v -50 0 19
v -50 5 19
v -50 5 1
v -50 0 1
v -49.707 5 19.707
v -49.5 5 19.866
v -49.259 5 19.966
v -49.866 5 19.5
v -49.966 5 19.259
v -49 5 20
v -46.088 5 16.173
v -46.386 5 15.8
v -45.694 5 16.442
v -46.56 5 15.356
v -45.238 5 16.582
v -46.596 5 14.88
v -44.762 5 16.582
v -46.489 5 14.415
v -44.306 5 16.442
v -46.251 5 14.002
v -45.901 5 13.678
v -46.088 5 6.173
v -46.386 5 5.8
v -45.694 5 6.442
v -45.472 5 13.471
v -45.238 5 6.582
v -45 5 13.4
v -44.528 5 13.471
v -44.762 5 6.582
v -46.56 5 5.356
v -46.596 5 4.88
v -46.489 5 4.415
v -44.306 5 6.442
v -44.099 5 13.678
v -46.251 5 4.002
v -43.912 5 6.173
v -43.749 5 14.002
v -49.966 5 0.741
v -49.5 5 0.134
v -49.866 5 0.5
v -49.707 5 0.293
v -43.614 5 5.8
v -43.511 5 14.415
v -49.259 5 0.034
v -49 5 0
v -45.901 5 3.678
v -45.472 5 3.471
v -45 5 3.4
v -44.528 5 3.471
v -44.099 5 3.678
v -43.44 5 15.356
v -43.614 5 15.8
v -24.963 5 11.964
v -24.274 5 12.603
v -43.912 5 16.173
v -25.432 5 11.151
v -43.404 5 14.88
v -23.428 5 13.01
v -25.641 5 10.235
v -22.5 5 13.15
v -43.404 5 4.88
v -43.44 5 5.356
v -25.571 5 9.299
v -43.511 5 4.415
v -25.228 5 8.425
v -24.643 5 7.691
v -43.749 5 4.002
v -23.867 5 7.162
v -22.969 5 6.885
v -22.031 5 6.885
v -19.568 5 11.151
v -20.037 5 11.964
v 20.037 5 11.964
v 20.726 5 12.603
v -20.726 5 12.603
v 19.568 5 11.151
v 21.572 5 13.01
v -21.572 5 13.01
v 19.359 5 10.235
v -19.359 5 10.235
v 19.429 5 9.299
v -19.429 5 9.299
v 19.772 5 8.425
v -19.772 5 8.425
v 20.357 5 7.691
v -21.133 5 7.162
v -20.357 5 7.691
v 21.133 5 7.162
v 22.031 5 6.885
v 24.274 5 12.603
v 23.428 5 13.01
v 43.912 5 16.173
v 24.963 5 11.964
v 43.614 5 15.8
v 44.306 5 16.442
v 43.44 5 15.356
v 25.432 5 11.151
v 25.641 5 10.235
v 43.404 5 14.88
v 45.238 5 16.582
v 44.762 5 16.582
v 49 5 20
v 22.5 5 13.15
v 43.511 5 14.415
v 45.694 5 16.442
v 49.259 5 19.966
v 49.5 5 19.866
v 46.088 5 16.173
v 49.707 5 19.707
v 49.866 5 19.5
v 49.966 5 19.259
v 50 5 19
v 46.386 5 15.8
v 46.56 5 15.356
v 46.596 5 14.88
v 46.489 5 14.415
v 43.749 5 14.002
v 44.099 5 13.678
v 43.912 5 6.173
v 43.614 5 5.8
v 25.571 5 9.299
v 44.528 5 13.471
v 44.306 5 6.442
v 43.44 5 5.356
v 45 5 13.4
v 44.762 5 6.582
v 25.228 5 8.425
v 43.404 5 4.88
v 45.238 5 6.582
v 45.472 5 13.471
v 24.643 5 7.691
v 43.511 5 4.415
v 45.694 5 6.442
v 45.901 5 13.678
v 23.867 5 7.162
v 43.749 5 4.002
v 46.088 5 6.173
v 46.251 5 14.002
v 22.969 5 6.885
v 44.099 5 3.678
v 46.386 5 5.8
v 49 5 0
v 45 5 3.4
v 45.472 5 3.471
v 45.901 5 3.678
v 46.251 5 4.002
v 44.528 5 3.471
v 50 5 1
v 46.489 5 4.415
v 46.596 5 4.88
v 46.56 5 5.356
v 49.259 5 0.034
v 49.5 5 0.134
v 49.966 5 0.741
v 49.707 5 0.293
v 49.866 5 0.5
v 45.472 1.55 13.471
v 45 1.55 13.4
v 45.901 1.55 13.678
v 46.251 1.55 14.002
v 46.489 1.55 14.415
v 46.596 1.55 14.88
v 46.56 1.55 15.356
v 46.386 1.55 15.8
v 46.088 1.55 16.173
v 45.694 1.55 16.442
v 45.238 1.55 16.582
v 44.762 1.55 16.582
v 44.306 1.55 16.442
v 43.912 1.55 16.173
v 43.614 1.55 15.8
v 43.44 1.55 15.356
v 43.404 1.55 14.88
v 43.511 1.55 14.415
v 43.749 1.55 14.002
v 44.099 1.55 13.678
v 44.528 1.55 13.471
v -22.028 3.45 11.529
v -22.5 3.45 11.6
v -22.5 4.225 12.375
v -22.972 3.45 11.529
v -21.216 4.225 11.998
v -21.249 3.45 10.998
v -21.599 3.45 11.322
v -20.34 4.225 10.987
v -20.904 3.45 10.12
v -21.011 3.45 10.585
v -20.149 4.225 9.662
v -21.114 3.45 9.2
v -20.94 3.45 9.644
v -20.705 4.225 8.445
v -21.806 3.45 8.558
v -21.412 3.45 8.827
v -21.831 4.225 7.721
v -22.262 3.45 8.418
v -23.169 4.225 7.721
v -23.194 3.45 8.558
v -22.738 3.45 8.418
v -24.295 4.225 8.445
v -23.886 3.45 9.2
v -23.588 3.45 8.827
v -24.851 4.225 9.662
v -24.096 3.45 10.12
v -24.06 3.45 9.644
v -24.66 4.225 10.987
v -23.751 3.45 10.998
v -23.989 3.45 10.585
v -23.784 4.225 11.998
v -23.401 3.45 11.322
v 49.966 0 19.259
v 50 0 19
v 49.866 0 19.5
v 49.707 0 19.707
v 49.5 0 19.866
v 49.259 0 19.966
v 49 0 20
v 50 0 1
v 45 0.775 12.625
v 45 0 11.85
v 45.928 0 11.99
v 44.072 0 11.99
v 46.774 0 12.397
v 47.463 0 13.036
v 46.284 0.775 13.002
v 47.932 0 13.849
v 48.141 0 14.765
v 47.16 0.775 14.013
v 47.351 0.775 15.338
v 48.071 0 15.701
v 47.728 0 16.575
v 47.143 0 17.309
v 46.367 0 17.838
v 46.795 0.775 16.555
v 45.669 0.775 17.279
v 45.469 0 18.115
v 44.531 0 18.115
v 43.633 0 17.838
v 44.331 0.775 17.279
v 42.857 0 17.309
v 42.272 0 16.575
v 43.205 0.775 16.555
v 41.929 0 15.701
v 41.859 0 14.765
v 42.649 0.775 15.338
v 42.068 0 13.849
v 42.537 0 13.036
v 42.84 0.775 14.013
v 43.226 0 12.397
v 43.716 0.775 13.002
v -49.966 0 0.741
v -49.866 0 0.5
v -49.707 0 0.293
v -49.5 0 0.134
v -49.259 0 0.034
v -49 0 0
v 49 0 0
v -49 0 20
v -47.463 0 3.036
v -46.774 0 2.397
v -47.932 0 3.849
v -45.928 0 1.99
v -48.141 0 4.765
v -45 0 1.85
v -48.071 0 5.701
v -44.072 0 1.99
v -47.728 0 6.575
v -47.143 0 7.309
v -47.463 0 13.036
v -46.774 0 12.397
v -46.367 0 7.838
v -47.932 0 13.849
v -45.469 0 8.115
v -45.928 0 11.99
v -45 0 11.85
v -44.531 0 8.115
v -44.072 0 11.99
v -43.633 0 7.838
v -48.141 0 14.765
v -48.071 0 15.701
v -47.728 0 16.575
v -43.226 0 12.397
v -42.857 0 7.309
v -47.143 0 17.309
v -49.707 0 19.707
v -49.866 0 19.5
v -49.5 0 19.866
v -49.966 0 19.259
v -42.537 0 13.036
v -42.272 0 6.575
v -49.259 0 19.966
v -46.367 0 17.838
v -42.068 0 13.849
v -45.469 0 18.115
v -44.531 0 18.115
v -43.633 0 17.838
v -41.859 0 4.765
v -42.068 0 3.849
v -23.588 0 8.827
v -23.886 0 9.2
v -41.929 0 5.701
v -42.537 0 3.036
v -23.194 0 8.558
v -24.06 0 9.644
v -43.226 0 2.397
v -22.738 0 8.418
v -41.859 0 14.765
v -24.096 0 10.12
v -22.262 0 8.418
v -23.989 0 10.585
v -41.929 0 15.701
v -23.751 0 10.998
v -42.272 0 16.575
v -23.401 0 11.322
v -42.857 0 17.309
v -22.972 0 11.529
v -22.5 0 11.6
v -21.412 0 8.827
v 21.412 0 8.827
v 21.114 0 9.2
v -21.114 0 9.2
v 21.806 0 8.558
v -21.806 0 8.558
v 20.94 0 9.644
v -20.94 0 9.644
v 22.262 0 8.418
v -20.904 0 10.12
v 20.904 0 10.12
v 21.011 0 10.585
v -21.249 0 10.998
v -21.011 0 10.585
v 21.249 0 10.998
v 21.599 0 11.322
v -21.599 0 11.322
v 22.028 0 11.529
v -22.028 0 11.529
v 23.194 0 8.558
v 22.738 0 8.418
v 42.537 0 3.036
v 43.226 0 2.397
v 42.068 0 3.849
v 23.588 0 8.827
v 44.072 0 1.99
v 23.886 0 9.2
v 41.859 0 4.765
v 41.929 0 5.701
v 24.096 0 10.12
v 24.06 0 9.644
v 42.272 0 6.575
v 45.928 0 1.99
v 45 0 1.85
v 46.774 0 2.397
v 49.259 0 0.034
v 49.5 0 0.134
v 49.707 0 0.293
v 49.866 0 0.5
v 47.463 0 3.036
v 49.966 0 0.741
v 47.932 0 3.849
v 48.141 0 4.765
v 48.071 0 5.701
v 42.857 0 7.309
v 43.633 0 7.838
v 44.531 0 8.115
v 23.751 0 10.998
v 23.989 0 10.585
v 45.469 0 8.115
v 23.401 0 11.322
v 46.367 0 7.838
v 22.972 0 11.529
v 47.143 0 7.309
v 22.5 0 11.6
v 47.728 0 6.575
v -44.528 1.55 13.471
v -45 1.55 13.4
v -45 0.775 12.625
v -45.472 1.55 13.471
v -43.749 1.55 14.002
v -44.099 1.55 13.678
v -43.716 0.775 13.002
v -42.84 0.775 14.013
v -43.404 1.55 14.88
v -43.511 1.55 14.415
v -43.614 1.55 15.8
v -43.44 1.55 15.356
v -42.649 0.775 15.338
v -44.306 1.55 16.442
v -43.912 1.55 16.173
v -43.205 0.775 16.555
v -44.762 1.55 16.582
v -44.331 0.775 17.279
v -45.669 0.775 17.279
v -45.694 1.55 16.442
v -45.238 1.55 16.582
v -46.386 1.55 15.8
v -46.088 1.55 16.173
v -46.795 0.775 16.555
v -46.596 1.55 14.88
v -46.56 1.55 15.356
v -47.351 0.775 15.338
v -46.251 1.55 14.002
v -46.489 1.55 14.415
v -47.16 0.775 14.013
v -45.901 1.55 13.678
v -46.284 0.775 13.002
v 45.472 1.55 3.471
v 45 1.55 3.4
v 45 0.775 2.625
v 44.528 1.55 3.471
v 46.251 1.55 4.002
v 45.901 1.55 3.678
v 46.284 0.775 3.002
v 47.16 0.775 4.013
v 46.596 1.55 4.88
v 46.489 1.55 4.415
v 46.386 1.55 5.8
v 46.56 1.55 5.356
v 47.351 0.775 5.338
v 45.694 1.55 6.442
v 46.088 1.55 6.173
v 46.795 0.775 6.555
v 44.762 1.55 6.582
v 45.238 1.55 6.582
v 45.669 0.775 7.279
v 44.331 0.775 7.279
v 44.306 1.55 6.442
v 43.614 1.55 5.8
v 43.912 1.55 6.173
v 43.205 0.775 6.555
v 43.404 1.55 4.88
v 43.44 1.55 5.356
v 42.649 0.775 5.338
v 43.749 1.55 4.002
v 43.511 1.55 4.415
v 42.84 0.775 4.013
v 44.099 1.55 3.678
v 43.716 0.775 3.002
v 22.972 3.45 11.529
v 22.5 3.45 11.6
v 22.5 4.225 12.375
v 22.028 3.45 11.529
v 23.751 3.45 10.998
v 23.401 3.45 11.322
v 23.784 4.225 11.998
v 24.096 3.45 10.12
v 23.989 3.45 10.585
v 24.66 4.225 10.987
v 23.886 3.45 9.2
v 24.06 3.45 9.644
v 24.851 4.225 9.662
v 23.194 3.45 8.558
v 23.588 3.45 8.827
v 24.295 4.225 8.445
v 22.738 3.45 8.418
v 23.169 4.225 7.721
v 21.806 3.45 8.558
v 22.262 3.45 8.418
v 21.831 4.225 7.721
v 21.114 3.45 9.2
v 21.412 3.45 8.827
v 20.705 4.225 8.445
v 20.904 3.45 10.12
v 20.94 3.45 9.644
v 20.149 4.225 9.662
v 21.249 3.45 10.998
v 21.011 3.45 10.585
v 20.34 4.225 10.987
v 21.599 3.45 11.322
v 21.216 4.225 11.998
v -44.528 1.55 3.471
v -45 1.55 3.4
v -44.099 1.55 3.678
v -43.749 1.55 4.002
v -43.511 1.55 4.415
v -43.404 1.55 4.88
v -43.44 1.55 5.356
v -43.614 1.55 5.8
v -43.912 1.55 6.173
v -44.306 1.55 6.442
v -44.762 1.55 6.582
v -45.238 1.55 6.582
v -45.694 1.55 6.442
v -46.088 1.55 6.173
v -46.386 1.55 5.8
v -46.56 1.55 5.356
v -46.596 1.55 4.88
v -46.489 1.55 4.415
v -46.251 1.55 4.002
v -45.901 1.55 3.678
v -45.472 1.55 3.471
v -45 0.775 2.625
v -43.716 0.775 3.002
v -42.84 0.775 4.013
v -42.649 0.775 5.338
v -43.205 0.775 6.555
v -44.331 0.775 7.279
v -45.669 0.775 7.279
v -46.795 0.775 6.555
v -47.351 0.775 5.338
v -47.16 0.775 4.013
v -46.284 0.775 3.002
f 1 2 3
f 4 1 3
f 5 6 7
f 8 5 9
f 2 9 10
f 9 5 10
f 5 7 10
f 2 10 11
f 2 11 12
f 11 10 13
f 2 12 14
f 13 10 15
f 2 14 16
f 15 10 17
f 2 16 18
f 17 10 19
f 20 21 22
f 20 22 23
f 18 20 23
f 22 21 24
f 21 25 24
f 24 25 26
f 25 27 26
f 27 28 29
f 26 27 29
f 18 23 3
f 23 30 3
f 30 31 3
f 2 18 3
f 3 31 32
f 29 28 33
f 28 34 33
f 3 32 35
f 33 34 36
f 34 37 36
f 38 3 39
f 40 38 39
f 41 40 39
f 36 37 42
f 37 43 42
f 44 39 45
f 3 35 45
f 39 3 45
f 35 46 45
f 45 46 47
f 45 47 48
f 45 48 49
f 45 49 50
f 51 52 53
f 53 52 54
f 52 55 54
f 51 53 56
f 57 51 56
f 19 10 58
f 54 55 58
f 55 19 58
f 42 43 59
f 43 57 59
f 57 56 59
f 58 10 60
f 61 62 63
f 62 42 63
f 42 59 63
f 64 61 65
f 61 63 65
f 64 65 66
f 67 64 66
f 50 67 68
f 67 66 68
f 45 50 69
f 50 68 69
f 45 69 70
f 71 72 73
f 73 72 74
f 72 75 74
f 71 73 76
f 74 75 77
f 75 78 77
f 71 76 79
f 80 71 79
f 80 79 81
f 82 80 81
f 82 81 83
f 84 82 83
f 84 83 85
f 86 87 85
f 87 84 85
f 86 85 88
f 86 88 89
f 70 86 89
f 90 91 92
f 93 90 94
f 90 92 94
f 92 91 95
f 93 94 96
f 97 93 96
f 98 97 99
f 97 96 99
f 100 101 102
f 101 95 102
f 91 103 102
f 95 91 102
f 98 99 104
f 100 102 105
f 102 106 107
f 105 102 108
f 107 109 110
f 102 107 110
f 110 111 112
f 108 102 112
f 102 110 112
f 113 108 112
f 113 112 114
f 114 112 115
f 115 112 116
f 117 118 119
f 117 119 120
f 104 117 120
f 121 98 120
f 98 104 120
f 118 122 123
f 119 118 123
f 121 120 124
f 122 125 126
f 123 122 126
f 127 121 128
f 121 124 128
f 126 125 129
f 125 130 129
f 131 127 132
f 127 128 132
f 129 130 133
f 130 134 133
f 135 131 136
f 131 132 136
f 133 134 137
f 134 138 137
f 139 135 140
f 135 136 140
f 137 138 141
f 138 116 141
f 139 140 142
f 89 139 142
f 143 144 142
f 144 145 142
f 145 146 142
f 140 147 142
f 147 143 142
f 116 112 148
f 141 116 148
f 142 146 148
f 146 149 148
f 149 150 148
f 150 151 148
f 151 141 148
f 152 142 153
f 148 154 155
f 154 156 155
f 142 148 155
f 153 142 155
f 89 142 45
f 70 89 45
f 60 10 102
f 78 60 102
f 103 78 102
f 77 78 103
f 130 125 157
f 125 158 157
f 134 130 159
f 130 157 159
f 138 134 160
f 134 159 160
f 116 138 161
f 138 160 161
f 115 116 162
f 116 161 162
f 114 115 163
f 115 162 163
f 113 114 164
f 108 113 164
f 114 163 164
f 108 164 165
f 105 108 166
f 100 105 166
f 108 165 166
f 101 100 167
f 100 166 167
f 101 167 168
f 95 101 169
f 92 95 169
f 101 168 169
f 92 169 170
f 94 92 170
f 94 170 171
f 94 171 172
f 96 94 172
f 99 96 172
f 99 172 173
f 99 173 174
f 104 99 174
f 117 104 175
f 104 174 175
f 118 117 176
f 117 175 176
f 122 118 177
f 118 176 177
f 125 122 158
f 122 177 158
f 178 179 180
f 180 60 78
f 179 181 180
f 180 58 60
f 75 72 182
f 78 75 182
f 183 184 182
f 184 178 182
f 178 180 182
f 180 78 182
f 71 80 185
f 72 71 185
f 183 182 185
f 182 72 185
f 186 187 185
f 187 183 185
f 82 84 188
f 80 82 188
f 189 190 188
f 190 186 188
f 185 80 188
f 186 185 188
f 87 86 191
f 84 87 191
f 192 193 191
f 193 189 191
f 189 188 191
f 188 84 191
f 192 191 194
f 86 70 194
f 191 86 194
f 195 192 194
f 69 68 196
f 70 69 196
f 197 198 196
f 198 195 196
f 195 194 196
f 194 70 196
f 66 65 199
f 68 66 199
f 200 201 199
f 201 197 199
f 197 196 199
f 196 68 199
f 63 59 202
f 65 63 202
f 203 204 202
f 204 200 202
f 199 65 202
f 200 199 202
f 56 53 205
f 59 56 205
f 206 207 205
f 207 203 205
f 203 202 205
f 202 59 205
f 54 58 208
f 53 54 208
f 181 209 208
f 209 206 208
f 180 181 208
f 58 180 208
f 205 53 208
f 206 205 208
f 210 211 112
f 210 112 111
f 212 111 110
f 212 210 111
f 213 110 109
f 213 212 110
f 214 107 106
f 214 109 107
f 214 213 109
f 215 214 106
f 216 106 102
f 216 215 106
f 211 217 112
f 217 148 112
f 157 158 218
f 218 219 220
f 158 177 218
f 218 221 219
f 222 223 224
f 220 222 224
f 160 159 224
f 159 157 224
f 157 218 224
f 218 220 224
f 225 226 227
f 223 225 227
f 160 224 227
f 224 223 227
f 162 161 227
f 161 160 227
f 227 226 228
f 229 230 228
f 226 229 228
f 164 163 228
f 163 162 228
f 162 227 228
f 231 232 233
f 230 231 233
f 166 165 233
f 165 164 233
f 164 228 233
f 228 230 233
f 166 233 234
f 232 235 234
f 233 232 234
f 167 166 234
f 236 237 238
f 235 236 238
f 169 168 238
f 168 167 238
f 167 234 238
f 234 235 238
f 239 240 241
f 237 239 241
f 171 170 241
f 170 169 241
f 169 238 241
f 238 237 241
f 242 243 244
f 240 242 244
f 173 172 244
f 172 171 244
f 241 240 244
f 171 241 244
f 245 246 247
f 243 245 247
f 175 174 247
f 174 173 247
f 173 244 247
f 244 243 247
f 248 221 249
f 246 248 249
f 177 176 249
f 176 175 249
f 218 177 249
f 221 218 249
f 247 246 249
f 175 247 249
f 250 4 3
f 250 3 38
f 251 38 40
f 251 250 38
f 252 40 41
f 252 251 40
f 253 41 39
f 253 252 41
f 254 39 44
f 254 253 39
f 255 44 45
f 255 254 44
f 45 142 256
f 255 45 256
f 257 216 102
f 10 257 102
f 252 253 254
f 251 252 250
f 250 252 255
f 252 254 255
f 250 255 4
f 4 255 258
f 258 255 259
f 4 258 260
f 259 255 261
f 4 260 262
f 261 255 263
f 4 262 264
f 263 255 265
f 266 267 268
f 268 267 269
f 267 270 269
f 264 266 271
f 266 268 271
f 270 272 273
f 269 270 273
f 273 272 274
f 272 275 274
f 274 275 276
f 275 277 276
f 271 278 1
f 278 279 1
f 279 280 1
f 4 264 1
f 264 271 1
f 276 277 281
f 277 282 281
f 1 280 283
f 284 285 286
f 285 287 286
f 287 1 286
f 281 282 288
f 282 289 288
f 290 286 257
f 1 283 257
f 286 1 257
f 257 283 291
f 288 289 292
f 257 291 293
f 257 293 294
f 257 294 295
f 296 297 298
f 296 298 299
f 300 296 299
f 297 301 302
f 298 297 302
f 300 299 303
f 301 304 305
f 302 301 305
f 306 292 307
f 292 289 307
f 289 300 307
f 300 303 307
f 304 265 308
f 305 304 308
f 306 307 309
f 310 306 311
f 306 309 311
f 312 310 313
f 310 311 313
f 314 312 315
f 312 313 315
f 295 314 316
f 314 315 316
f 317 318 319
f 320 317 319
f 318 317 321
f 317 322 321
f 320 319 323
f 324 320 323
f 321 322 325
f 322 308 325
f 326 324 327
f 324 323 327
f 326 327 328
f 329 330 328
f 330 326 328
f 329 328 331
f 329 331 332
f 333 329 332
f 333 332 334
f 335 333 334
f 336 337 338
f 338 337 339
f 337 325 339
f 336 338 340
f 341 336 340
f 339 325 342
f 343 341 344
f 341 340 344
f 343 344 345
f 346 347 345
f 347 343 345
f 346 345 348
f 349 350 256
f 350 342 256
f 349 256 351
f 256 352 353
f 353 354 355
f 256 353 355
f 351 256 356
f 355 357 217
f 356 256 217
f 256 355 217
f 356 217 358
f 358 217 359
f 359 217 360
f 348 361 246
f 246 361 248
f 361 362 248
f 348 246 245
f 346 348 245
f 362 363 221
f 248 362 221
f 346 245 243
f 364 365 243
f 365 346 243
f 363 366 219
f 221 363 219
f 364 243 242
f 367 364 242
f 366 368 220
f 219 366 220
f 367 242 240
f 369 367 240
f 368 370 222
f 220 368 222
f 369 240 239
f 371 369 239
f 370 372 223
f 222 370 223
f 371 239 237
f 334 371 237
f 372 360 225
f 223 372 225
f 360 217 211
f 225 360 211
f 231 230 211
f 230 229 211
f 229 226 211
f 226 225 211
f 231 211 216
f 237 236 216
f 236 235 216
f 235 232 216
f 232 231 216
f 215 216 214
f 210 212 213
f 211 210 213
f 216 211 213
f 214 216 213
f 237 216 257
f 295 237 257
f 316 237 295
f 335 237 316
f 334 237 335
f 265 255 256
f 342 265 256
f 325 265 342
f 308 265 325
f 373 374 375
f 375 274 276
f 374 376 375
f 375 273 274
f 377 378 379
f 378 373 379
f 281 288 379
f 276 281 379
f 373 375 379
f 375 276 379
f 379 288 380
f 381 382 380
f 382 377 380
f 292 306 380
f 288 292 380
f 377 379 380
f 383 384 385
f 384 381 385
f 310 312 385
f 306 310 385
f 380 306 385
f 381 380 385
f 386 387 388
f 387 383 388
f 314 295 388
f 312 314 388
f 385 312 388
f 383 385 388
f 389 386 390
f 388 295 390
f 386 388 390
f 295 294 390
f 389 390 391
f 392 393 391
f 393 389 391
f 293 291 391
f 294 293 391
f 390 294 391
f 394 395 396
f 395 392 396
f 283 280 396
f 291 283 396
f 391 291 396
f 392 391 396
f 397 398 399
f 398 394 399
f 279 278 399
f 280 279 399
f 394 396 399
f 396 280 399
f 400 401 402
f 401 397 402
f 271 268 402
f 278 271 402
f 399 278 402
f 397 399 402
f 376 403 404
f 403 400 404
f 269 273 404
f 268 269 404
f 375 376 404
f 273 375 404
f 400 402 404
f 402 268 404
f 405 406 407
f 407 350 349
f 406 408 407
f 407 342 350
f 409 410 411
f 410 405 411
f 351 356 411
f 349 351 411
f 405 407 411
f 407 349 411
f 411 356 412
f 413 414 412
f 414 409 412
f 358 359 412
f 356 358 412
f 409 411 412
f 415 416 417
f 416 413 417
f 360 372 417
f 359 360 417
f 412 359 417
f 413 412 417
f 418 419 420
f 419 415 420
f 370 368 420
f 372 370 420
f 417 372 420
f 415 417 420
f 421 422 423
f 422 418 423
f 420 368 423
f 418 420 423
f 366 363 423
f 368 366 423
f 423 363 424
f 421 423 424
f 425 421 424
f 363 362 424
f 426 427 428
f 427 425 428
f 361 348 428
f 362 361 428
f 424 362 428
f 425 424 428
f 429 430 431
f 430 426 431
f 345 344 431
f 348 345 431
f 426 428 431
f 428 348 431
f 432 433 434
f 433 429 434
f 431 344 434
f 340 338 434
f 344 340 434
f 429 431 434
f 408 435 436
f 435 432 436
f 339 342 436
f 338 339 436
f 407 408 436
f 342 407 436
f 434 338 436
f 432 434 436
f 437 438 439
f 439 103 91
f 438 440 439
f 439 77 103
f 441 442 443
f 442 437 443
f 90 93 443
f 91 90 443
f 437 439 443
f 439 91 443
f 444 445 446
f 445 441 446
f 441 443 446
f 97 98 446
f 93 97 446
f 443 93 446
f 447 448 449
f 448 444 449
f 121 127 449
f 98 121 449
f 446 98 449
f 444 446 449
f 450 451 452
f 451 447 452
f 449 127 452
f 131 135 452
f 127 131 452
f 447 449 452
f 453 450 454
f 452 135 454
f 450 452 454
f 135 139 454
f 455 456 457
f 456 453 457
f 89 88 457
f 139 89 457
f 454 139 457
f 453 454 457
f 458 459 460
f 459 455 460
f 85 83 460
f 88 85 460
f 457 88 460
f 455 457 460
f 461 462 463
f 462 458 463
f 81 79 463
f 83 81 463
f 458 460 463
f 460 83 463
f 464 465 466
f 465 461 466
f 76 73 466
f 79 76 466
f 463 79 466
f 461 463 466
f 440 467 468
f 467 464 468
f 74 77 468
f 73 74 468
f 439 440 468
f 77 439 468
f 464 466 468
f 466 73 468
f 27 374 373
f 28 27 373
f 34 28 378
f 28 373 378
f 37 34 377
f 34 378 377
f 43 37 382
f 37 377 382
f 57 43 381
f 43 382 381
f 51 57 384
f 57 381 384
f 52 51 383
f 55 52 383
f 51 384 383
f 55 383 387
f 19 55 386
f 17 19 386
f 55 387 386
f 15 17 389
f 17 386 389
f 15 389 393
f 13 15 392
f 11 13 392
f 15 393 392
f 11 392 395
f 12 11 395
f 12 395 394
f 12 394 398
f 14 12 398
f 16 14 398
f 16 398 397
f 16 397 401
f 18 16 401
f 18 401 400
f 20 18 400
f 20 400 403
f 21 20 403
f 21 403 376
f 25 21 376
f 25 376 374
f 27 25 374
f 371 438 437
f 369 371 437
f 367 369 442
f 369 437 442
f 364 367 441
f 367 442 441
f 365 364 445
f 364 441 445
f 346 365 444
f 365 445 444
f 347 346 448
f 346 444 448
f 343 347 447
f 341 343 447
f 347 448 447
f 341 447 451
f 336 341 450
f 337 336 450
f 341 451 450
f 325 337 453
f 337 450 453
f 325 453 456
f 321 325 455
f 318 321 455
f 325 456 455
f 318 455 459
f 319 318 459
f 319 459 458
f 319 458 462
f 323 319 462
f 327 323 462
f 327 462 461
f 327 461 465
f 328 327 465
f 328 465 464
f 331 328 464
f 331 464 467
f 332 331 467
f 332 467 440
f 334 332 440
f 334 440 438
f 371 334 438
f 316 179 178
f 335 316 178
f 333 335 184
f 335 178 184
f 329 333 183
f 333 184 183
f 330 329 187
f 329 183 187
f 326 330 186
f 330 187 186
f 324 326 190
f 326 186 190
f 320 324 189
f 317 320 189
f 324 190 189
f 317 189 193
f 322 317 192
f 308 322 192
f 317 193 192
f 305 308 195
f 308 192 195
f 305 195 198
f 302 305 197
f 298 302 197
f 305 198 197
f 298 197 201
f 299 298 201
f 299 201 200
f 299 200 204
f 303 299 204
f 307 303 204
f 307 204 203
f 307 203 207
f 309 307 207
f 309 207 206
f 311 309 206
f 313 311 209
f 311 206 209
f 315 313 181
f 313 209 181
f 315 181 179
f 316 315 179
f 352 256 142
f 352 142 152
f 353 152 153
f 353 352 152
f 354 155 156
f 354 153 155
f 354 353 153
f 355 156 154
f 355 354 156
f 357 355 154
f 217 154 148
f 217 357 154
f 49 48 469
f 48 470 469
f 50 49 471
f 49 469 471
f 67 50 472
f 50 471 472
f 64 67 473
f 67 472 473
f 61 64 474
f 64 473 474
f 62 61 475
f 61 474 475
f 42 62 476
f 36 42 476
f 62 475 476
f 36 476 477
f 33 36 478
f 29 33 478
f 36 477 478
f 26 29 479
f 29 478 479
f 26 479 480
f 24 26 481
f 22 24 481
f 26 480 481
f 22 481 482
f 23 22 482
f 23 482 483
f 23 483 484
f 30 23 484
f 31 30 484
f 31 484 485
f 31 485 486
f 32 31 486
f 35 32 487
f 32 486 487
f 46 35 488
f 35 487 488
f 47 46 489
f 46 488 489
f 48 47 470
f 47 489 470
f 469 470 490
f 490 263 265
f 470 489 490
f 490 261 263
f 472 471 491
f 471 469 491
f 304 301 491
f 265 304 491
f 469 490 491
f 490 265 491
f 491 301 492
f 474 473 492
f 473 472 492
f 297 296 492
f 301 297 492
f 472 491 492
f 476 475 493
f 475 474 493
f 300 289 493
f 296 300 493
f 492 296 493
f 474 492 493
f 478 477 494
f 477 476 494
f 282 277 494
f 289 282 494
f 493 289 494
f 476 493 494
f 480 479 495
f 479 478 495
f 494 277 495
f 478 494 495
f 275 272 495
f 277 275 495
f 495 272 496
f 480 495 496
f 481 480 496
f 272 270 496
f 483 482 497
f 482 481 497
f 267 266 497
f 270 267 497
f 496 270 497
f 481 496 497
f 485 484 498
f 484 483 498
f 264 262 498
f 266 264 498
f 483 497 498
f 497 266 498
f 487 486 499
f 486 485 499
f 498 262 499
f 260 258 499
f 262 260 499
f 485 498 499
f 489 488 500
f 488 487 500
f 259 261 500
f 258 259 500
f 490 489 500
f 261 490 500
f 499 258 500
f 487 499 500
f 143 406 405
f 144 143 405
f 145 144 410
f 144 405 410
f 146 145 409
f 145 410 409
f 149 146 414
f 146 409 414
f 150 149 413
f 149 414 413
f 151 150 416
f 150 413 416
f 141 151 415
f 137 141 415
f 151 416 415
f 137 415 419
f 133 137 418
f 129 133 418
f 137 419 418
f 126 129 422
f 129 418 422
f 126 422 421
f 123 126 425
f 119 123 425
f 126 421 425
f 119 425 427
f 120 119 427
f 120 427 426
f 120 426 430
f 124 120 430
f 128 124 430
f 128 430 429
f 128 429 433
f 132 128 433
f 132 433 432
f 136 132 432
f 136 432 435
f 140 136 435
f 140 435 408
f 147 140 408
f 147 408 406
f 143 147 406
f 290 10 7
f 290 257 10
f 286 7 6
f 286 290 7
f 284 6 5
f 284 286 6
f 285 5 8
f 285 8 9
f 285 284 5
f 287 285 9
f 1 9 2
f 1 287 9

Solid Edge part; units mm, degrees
sketch "Sketch1" plane through (0, 0, 0) normal (-1, 0, 0) x (0, -1, 0)
  line L0 (0, 20) -> (-5, 20)
  line L1 (-5, 20) -> (-5, 0)
  line L2 (-5, 0) -> (0, 0)
  line L3 (0, 0) -> (0, 20)
extrude "Protrusion1" add sketch "Sketch1" along normal mid plane 90
sketch "Sketch2" plane through (0, 0, 7.5) normal (0, -1, 0) x (1, 0, 0)
  line L0 (-45, 12.5) -> (-50, 12.5)
  line L1 (-50, 12.5) -> (-50, 7.5)
  line L2 (-50, 7.5) -> (-45, 7.5)
  line L3 (-45, 7.5) -> (-45, 12.5)
  line L4 (-45, -2.5) -> (-50, -2.5)
  line L5 (-50, -2.5) -> (-50, -7.5)
  line L6 (-50, -7.5) -> (-45, -7.5)
  line L7 (-45, -7.5) -> (-45, -2.5)
  line L8 (45, 7.5) -> (50, 7.5)
  line L9 (50, 7.5) -> (50, 12.5)
  line L10 (50, 12.5) -> (45, 12.5)
  line L11 (45, 12.5) -> (45, 7.5)
  line L12 (45, -7.5) -> (50, -7.5)
  line L13 (50, -7.5) -> (50, -2.5)
  line L14 (50, -2.5) -> (45, -2.5)
  line L15 (45, -2.5) -> (45, -7.5)
extrude "ExtrudedProtrusion_2" add sketch "Sketch2" against normal blind 5
hole "Hole_1" at (22.5, 0, 10) direction (0, 1, 0) diameter 3 depth 50.8
hole "Hole1" at (-22.5, 0, 10) direction (0, 1, 0) diameter 3 depth 50.8
sketch "Sketch3" plane through (0, 5, 10) normal (0, 1, 0) x (-1, 0, 0)
  line L0 (-50, 10) -> (-45, 10)
  line L1 (-45, 10) -> (-45, -10)
  line L2 (-45, -10) -> (-50, -10)
  line L3 (-50, -10) -> (-50, 10)
  line L4 (50, 10) -> (45, 10)
  line L5 (45, 10) -> (45, -10)
  line L6 (45, -10) -> (50, -10)
  line L7 (50, -10) -> (50, 10)
extrude "ExtrudedCutout_1" cut sketch "Sketch3" against normal blind 5
sketch "Sketch4" plane through (0, 5, 10) normal (0, 1, 0) x (-1, 0, 0)
  line L0 (-50, 10) -> (-45, 10)
  line L1 (-45, 10) -> (-45, -10)
  line L2 (-45, -10) -> (-50, -10)
  line L3 (-50, -10) -> (-50, 10)
  line L4 (45, 10) -> (50, 10)
  line L5 (50, 10) -> (50, -10)
  line L6 (50, -10) -> (45, -10)
  line L7 (45, -10) -> (45, 10)
extrude "ExtrudedProtrusion_3" add sketch "Sketch4" against normal blind 5
hole "Hole_7" at (-45, 0, 15) direction (0, 1, 0) diameter 3.2 end up to next countersink diameter 6.3 countersink angle 90
hole "Hole2" at (-45, 0, 5) direction (0, 1, 0) diameter 3.2 end up to next countersink diameter 6.3 countersink angle 90
hole "Hole3" at (45, 0, 5) direction (0, 1, 0) diameter 3.2 end up to next countersink diameter 6.3 countersink angle 90
hole "Hole4" at (45, 0, 15) direction (0, 1, 0) diameter 3.2 end up to next countersink diameter 6.3 countersink angle 90
hole "Hole_11" at (22.5, 5, 10) direction (0, -1, 0) diameter 3.2 end up to next countersink diameter 6.3 countersink angle 90
hole "Hole5" at (-22.5, 5, 10) direction (0, -1, 0) diameter 3.2 end up to next countersink diameter 6.3 countersink angle 90
fillet "Round_1" radius 1 4 edges at (50, 2.5, 20) (50, 2.5, 0) (-50, 2.5, 20) (-50, 2.5, 0)
properties material "Polycarbonate"
